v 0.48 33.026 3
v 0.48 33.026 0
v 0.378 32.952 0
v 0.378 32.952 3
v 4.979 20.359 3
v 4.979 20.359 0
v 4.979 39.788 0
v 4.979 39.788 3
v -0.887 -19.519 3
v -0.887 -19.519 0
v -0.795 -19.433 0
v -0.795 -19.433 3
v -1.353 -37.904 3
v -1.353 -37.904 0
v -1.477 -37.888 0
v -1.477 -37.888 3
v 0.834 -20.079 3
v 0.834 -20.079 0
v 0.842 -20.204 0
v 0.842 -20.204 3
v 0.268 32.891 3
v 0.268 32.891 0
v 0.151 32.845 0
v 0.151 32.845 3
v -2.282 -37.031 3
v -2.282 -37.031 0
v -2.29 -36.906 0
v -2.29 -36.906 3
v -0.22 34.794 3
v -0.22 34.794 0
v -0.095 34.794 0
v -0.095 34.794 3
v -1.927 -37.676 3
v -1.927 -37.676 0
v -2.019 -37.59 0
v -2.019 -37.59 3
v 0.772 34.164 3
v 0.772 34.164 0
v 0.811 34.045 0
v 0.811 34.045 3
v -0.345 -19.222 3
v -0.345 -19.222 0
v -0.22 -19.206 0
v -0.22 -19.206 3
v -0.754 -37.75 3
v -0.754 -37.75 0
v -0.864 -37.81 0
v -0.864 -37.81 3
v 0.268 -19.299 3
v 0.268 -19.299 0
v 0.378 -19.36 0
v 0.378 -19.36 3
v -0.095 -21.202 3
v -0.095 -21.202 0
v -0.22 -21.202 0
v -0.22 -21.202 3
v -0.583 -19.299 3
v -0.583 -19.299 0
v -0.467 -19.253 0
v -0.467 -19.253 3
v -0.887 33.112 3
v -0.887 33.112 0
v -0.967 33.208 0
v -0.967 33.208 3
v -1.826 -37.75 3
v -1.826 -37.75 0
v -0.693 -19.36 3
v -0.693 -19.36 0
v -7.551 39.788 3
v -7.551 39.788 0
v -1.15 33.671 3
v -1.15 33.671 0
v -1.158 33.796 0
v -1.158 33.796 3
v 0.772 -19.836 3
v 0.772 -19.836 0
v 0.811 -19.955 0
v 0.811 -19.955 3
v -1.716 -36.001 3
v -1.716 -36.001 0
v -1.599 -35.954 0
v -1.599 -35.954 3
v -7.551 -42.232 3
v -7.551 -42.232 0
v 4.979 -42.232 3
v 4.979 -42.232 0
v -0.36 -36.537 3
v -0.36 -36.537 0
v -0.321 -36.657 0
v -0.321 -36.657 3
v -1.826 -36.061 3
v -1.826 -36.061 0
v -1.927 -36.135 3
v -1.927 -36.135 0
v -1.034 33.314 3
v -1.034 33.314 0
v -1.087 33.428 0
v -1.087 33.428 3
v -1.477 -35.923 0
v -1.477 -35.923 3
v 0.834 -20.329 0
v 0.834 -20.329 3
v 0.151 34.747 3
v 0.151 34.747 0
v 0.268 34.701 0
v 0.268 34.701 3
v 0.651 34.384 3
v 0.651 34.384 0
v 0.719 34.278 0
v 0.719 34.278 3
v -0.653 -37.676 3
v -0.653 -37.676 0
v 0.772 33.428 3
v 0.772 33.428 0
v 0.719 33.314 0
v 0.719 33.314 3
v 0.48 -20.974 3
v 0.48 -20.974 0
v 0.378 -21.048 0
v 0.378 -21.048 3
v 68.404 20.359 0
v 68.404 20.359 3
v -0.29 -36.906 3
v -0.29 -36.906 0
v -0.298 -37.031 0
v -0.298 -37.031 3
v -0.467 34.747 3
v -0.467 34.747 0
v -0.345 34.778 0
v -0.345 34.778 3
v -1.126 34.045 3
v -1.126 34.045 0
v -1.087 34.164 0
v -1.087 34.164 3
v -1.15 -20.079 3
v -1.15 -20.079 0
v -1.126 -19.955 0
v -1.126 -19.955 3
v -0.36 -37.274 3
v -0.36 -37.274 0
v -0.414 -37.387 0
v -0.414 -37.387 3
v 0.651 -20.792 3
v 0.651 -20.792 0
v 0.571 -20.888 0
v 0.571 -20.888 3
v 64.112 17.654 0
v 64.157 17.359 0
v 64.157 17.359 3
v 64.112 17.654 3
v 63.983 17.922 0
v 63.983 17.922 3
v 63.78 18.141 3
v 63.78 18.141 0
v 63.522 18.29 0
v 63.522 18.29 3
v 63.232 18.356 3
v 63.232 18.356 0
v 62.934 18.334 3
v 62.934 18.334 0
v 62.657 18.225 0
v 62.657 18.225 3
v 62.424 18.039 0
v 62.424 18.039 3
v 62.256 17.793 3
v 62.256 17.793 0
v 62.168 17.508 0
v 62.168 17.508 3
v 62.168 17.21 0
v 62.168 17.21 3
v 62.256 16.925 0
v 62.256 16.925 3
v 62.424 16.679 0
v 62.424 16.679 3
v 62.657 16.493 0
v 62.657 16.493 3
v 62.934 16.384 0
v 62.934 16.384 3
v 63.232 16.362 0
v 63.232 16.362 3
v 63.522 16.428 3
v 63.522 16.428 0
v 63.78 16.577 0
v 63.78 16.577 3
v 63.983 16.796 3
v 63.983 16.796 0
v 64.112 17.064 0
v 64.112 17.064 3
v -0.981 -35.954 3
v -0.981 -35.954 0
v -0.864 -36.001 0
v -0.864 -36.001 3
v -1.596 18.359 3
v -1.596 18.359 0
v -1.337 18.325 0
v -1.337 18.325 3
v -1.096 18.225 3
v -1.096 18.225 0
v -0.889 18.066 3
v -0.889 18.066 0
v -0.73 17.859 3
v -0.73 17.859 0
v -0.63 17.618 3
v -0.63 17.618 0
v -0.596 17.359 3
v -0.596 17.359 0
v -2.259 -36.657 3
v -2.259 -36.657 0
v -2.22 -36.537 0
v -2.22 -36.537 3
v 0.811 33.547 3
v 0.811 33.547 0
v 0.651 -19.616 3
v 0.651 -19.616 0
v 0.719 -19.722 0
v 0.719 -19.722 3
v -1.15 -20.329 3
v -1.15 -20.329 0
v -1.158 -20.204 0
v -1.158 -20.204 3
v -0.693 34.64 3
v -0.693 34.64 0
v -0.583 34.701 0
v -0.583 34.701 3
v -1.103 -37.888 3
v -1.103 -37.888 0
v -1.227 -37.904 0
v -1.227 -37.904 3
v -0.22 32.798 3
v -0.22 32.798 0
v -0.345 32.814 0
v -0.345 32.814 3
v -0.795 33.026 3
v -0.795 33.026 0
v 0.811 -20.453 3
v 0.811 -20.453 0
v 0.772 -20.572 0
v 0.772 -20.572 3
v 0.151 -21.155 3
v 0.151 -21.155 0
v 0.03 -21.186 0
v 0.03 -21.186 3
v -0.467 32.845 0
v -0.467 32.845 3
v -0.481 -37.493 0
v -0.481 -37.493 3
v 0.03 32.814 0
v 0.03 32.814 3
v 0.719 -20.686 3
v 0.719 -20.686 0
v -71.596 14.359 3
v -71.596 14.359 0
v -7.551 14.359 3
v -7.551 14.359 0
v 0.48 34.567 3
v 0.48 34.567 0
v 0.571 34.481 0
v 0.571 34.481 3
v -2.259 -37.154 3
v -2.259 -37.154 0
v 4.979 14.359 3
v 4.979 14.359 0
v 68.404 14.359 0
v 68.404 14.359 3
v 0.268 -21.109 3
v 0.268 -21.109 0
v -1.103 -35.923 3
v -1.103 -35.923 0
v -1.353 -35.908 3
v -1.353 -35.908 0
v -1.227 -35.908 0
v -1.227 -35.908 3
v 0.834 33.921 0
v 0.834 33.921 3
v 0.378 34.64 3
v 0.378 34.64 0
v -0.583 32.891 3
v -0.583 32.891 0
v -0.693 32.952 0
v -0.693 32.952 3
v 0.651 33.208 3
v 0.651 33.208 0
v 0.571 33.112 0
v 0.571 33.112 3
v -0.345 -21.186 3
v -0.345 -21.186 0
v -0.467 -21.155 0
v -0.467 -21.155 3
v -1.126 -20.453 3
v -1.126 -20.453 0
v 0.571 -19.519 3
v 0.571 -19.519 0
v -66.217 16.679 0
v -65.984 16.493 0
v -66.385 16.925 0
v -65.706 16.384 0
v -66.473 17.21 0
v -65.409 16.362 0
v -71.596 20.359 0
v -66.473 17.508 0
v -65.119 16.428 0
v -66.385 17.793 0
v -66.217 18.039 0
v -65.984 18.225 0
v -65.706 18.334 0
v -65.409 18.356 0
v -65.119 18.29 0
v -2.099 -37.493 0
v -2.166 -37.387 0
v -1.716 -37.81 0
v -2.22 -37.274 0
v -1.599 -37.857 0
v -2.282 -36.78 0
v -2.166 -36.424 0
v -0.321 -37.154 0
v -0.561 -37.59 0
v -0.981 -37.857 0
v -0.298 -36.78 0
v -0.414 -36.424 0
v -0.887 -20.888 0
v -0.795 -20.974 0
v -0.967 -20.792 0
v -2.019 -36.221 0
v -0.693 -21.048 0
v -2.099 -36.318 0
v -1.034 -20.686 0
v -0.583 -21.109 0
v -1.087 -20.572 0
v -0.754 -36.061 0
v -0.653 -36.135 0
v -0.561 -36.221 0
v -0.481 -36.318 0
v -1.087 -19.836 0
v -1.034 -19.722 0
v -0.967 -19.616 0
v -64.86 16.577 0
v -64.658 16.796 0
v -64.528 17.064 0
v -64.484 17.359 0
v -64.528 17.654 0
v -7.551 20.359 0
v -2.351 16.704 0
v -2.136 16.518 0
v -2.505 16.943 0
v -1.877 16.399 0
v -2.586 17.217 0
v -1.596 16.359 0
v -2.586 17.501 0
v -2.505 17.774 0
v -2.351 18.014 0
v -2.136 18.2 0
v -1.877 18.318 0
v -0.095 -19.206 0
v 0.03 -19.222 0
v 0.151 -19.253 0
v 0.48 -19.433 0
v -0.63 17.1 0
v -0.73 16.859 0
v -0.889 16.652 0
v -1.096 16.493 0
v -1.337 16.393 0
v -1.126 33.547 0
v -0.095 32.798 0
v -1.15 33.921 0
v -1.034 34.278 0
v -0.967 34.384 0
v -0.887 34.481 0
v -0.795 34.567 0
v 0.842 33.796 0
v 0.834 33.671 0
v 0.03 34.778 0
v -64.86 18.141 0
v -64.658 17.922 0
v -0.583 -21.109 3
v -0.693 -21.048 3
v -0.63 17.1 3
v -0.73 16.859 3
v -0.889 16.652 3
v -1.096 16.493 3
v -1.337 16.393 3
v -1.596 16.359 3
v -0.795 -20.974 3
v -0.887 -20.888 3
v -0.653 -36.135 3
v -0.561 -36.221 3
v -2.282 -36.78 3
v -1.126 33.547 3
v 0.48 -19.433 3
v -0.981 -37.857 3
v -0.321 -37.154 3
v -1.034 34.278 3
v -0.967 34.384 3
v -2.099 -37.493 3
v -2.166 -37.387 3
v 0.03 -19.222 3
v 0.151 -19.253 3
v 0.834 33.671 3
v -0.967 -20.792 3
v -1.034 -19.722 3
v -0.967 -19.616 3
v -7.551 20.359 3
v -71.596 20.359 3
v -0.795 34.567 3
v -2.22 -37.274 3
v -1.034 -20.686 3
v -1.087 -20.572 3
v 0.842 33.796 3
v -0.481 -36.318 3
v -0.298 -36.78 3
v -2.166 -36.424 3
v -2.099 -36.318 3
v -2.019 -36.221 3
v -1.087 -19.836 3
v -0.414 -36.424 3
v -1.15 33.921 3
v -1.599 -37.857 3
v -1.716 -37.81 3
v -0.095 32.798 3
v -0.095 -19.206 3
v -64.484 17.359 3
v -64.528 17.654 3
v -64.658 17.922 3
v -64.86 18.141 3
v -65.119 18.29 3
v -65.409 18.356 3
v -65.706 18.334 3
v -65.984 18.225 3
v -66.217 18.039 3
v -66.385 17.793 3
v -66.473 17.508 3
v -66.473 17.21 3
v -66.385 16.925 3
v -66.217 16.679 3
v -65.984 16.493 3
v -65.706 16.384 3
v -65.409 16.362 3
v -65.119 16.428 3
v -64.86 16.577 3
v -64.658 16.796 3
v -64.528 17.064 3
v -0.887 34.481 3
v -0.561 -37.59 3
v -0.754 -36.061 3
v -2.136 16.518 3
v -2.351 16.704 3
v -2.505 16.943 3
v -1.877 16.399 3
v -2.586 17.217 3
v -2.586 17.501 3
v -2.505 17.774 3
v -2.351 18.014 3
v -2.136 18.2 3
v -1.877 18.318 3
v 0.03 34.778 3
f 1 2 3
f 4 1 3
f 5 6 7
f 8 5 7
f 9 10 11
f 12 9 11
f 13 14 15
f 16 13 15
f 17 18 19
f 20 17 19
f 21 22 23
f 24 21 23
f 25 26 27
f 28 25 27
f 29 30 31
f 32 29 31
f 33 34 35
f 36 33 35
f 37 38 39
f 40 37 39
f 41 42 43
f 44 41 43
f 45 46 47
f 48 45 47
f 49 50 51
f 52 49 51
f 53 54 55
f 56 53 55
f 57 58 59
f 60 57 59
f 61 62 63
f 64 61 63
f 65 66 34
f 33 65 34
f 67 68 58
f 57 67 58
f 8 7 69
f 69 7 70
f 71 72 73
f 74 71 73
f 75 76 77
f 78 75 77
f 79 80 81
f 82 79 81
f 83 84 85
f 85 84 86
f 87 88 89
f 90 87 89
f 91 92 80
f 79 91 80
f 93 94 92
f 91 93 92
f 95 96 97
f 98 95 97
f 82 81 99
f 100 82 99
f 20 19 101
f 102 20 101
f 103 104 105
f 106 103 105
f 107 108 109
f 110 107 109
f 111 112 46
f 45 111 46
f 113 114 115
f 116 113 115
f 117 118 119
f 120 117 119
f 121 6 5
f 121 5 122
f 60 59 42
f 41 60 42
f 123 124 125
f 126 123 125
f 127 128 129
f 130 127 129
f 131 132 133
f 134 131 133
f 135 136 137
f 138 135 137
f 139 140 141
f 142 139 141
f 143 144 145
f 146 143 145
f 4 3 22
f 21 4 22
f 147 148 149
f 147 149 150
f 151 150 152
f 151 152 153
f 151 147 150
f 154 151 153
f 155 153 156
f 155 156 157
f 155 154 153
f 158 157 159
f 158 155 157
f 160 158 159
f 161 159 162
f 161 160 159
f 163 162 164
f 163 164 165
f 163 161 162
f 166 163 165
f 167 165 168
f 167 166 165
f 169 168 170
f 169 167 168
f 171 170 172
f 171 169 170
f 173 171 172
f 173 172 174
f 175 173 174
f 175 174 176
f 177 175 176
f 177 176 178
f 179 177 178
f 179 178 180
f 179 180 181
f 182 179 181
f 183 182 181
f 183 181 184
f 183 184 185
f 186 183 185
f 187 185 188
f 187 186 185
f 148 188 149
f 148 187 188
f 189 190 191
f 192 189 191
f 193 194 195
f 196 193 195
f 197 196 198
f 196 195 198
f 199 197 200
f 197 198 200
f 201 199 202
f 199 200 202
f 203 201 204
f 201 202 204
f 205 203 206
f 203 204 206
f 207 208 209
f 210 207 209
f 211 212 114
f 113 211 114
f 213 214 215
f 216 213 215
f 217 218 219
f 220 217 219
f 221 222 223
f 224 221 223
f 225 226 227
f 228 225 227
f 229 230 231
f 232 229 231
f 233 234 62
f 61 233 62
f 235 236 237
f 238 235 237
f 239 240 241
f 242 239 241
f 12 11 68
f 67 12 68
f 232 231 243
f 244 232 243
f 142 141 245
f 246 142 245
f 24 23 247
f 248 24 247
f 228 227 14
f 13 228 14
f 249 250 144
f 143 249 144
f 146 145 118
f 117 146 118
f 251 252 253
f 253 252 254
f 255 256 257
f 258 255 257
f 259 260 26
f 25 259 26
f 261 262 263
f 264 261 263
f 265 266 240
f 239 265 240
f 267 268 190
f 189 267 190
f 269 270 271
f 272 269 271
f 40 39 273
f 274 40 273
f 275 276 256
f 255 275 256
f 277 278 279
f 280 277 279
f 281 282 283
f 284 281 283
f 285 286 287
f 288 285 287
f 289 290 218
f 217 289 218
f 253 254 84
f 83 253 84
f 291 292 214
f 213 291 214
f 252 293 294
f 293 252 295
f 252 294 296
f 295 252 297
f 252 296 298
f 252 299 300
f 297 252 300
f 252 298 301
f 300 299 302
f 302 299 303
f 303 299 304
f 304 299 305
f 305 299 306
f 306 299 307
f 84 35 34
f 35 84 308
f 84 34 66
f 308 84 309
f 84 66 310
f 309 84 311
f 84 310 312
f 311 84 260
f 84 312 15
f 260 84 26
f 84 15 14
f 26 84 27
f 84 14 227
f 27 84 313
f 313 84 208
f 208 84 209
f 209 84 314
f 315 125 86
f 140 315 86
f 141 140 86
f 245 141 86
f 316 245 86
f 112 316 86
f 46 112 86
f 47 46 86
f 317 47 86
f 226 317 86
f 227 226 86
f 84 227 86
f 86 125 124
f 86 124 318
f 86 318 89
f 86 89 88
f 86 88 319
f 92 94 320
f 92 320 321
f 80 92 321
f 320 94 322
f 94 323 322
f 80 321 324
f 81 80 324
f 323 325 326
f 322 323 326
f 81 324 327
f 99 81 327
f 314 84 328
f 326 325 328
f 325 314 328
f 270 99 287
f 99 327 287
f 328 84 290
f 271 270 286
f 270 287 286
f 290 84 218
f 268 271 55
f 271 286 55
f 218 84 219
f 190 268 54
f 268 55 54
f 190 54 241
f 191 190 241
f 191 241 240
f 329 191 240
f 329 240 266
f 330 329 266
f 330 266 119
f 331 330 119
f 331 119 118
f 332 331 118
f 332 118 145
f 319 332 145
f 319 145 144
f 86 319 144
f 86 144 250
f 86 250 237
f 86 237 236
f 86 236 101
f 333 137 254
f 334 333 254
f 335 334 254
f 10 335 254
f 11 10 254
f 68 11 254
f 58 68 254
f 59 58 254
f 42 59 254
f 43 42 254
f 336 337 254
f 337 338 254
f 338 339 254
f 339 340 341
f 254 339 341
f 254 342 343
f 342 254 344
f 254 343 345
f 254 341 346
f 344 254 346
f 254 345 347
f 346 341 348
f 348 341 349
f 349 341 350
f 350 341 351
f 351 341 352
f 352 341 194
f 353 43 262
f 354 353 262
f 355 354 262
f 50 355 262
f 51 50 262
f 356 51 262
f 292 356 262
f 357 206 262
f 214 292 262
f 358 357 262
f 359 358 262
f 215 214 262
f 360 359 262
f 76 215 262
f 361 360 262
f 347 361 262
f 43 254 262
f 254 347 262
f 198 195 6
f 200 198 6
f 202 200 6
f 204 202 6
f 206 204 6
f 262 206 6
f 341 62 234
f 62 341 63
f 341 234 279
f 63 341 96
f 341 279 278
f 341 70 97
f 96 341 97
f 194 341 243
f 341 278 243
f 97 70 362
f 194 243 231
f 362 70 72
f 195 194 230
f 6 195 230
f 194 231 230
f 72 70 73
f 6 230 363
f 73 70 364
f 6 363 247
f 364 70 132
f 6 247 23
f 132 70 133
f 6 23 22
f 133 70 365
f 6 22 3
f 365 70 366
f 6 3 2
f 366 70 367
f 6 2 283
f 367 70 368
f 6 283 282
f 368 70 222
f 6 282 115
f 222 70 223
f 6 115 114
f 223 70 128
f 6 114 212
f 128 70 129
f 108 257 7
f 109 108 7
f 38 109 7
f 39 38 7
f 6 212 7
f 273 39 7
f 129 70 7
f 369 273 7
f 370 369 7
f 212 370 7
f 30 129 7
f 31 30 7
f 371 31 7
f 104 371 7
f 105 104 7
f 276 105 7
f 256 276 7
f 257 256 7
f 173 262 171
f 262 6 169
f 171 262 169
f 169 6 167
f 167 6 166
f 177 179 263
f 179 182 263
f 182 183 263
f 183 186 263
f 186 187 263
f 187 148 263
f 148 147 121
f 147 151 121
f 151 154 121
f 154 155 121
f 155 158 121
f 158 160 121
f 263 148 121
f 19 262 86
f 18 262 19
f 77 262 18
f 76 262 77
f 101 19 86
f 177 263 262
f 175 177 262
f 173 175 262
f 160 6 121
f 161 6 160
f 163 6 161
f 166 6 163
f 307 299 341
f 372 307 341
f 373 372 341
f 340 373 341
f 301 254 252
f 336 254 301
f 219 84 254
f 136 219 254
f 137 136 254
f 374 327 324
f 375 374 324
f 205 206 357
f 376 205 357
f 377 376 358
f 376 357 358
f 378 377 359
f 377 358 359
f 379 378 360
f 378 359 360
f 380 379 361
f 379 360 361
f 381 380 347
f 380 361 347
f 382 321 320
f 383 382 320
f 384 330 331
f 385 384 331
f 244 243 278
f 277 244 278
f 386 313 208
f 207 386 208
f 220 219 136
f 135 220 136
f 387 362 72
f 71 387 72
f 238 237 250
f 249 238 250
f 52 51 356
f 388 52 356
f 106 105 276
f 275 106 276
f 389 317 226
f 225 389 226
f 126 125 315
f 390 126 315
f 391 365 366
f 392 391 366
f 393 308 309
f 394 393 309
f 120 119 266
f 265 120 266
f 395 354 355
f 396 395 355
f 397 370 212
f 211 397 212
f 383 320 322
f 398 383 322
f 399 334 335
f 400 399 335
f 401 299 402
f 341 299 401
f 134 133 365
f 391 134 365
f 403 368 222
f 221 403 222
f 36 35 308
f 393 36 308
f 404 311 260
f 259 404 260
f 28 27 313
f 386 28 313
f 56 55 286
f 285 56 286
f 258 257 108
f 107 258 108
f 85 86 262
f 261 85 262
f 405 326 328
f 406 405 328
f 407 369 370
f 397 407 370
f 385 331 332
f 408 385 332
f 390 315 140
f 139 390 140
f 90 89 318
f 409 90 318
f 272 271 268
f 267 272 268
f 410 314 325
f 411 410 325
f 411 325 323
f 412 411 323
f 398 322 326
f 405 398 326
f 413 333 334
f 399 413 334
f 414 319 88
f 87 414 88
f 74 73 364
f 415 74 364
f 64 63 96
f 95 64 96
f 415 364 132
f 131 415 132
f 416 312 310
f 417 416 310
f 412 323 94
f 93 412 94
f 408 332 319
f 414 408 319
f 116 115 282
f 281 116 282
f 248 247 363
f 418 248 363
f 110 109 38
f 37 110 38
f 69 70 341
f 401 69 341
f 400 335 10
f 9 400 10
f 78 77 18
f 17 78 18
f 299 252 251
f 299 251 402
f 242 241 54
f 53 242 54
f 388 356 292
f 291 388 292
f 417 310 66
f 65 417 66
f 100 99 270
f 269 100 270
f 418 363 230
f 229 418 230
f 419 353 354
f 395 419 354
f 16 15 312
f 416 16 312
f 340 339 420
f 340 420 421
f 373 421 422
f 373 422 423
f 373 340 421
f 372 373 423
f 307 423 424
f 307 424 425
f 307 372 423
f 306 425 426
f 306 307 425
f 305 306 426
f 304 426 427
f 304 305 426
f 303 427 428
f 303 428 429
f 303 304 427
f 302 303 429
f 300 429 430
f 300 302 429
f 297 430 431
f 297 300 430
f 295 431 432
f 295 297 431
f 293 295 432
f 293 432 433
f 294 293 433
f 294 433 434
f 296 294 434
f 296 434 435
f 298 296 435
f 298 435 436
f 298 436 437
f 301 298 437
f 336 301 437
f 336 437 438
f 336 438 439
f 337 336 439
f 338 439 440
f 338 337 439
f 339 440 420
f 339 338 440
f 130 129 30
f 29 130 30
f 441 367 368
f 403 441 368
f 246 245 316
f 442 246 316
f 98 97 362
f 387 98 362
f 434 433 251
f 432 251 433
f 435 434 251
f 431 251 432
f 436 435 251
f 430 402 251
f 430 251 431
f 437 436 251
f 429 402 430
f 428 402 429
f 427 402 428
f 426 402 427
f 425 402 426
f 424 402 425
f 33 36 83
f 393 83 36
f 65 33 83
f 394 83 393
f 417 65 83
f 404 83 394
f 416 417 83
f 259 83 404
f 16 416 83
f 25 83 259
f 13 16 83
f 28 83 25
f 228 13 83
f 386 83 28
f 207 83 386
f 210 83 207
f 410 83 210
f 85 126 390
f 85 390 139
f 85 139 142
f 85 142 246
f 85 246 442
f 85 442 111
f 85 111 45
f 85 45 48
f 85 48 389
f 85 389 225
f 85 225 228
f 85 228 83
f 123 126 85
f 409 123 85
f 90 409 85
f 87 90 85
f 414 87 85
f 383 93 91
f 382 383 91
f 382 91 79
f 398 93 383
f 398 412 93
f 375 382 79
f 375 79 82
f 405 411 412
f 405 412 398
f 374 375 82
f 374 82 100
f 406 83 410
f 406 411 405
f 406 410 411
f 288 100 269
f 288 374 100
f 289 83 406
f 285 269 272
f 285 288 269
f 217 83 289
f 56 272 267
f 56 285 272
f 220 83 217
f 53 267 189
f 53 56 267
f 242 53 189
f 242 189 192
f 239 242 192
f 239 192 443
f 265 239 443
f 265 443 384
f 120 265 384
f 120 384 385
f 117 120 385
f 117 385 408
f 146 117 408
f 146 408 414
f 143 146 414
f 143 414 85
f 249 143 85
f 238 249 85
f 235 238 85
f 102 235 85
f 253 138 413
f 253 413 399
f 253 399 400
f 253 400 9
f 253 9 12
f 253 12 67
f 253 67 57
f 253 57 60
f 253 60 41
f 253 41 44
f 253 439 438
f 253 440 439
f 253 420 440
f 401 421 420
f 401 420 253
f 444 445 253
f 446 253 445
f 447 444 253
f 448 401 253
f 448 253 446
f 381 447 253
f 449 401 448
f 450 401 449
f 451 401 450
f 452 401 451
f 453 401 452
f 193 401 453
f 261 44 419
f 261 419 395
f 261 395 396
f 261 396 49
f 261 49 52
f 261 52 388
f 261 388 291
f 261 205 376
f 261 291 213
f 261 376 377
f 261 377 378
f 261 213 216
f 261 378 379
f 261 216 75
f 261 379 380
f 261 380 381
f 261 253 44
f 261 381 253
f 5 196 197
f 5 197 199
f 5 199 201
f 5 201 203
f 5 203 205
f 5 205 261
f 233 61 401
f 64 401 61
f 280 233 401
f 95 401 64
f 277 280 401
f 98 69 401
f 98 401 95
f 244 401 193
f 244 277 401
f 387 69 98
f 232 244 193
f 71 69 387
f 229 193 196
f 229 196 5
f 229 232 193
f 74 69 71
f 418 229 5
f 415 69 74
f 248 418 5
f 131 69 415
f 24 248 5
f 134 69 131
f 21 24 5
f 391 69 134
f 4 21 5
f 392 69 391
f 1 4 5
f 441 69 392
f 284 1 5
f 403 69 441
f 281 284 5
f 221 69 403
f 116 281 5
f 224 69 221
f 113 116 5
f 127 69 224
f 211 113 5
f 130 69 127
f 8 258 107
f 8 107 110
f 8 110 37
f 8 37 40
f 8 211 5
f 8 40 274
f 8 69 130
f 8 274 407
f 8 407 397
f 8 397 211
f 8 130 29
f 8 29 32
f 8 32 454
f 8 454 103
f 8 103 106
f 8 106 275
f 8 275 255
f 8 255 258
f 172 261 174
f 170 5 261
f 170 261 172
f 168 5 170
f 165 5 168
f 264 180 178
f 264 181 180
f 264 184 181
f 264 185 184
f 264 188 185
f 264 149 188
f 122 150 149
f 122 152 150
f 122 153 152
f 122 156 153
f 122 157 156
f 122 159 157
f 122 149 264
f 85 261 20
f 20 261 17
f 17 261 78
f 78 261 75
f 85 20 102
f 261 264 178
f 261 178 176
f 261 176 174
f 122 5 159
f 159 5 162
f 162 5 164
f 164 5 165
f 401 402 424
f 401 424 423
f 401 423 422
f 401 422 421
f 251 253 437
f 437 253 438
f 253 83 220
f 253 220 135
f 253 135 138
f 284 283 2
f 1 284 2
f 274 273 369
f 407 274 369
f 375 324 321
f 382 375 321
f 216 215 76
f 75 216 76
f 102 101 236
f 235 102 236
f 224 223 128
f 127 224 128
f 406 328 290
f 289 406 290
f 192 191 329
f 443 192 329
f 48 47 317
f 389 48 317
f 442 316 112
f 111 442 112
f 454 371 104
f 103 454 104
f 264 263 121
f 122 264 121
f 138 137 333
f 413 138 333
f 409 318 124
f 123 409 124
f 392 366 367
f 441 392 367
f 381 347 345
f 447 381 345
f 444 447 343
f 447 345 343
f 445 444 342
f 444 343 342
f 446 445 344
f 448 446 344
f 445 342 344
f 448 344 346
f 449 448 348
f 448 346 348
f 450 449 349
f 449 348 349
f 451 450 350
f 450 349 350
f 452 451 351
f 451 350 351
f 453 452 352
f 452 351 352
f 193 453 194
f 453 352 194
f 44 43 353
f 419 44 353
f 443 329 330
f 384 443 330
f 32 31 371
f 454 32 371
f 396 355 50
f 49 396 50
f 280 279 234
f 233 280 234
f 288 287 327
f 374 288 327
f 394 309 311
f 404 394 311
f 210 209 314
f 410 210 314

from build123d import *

# Parameters (mm, degrees)
F0_W     = 64.0446986989
F0_H     = 6
F0_R     = 1
F0_W_2   = 63.4251574627
F1_DEPTH = 3


# Not quite as in the source:
# - a feature names something its author has since deleted; it is built from what else it names


with BuildPart() as f1:
    # F0 (on Top) → F1 (new body)
    with BuildSketch(Plane.XY):
        Polygon((-7.5510093011, -42.2321148217), (-1.289947, -42.2321148217), (4.9791345373, -42.2321148217), (4.9791345373, 14.358856), (-1.595708, 14.358856), (-7.5510093011, 14.358856), align=None)
        Polygon((-0.297832, -36.78021), (-0.289947, -36.905543), (-0.297832, -37.030876), (-0.321364, -37.154233), (-0.360171, -37.273667), (-0.41364, -37.387296), (-0.48093, -37.493328), (-0.560978, -37.59009), (-0.652523, -37.676056), (-0.75412, -37.749871), (-0.864168, -37.81037), (-0.98093, -37.856599), (-1.102566, -37.88783), (-1.227157, -37.90357), (-1.352738, -37.90357), (-1.477328, -37.88783), (-1.598964, -37.856599), (-1.715726, -37.81037), (-1.825774, -37.749871), (-1.927371, -37.676056), (-2.018916, -37.59009), (-2.098964, -37.493328), (-2.166254, -37.387296), (-2.219724, -37.273667), (-2.25853, -37.154233), (-2.282062, -37.030876), (-2.289947, -36.905543), (-2.282062, -36.78021), (-2.25853, -36.656853), (-2.219724, -36.537418), (-2.166254, -36.423789), (-2.098964, -36.317758), (-2.018916, -36.220996), (-1.927371, -36.13503), (-1.825774, -36.061215), (-1.715726, -36.000716), (-1.598964, -35.954486), (-1.477328, -35.923256), (-1.352738, -35.907516), (-1.227157, -35.907516), (-1.102566, -35.923256), (-0.98093, -35.954486), (-0.864168, -36.000716), (-0.75412, -36.061215), (-0.652523, -36.13503), (-0.560978, -36.220996), (-0.48093, -36.317758), (-0.41364, -36.423789), (-0.360171, -36.537418), (-0.321364, -36.656853), align=None, mode=Mode.SUBTRACT)
        Polygon((0.834477, -20.078598), (0.842362, -20.203931), (0.834477, -20.329264), (0.810945, -20.452621), (0.772138, -20.572056), (0.718669, -20.685685), (0.651379, -20.791716), (0.571331, -20.888478), (0.479786, -20.974444), (0.378189, -21.048259), (0.268141, -21.108758), (0.151379, -21.154988), (0.029743, -21.186218), (-0.094848, -21.201958), (-0.220429, -21.201958), (-0.345019, -21.186218), (-0.466655, -21.154988), (-0.583417, -21.108758), (-0.693465, -21.048259), (-0.795062, -20.974444), (-0.886607, -20.888478), (-0.966655, -20.791716), (-1.033945, -20.685685), (-1.087415, -20.572056), (-1.126221, -20.452621), (-1.149753, -20.329264), (-1.157638, -20.203931), (-1.149753, -20.078598), (-1.126221, -19.955241), (-1.087415, -19.835807), (-1.033945, -19.722178), (-0.966655, -19.616146), (-0.886607, -19.519384), (-0.795062, -19.433418), (-0.693465, -19.359603), (-0.583417, -19.299104), (-0.466655, -19.252875), (-0.345019, -19.221644), (-0.220429, -19.205904), (-0.094848, -19.205904), (0.029743, -19.221644), (0.151379, -19.252875), (0.268141, -19.299104), (0.378189, -19.359603), (0.479786, -19.433418), (0.571331, -19.519384), (0.651379, -19.616146), (0.718669, -19.722178), (0.772138, -19.835807), (0.810945, -19.955241), align=None, mode=Mode.SUBTRACT)
        Polygon((-7.5510093011, 39.788339287), (-7.5510093011, 20.358856), (-1.595708, 20.358856), (4.9791345373, 20.358856), (4.9791345373, 28.8824737072), (4.9791345373, 39.788339287), (-1.289947, 39.788339287), align=None)
        Polygon((0.834477, 33.921402), (0.842362, 33.796069), (0.834477, 33.670736), (0.810945, 33.547379), (0.772138, 33.427944), (0.718669, 33.314315), (0.651379, 33.208284), (0.571331, 33.111522), (0.479786, 33.025556), (0.378189, 32.951741), (0.268141, 32.891242), (0.151379, 32.845012), (0.029743, 32.813782), (-0.094848, 32.798042), (-0.220429, 32.798042), (-0.345019, 32.813782), (-0.466655, 32.845012), (-0.583417, 32.891242), (-0.693465, 32.951741), (-0.795062, 33.025556), (-0.886607, 33.111522), (-0.966655, 33.208284), (-1.033945, 33.314315), (-1.087415, 33.427944), (-1.126221, 33.547379), (-1.149753, 33.670736), (-1.157638, 33.796069), (-1.149753, 33.921402), (-1.126221, 34.044759), (-1.087415, 34.164193), (-1.033945, 34.277822), (-0.966655, 34.383854), (-0.886607, 34.480616), (-0.795062, 34.566582), (-0.693465, 34.640397), (-0.583417, 34.700896), (-0.466655, 34.747125), (-0.345019, 34.778356), (-0.220429, 34.794096), (-0.094848, 34.794096), (0.029743, 34.778356), (0.151379, 34.747125), (0.268141, 34.700896), (0.378189, 34.640397), (0.479786, 34.566582), (0.571331, 34.480616), (0.651379, 34.383854), (0.718669, 34.277822), (0.772138, 34.164193), (0.810945, 34.044759), align=None, mode=Mode.SUBTRACT)
        with Locations((-39.5733586505, 17.358856)):
            Rectangle(F0_W, F0_H)
        with Locations((-65.4838681221, 17.358856)):
            Circle(F0_R, mode=Mode.SUBTRACT)
        with Locations((36.6917132686, 17.358856)):
            Rectangle(F0_W_2, F0_H)
        with Locations((63.1569251418, 17.358856)):
            Circle(F0_R, mode=Mode.SUBTRACT)
        with BuildLine():
            Line((-7.5510093011, 20.358856), (-7.5510093011, 14.358856))
            Line((-7.5510093011, 14.358856), (-1.595708, 14.358856))
            Line((-1.595708, 14.358856), (-1.595708, 16.358856))
            ThreePointArc((-1.595708, 16.358856), (-2.595708, 17.358856), (-1.595708, 18.358856))
            Line((-1.595708, 18.358856), (-1.595708, 20.358856))
            Line((-1.595708, 20.358856), (-7.5510093011, 20.358856))
        make_face()
        with BuildLine():
            Line((-1.595708, 14.358856), (4.9791345373, 14.358856))
            Line((4.9791345373, 14.358856), (4.9791345373, 20.358856))
            Line((4.9791345373, 20.358856), (-1.595708, 20.358856))
            Line((-1.595708, 20.358856), (-1.595708, 18.358856))
            ThreePointArc((-1.595708, 18.358856), (-0.8886012188, 18.0659627812), (-0.595708, 17.358856))
            ThreePointArc((-0.595708, 17.358856), (-0.8886012188, 16.6517492188), (-1.595708, 16.358856))
            Line((-1.595708, 16.358856), (-1.595708, 14.358856))
        make_face()
    extrude(amount=F1_DEPTH)


solid = f1.part
